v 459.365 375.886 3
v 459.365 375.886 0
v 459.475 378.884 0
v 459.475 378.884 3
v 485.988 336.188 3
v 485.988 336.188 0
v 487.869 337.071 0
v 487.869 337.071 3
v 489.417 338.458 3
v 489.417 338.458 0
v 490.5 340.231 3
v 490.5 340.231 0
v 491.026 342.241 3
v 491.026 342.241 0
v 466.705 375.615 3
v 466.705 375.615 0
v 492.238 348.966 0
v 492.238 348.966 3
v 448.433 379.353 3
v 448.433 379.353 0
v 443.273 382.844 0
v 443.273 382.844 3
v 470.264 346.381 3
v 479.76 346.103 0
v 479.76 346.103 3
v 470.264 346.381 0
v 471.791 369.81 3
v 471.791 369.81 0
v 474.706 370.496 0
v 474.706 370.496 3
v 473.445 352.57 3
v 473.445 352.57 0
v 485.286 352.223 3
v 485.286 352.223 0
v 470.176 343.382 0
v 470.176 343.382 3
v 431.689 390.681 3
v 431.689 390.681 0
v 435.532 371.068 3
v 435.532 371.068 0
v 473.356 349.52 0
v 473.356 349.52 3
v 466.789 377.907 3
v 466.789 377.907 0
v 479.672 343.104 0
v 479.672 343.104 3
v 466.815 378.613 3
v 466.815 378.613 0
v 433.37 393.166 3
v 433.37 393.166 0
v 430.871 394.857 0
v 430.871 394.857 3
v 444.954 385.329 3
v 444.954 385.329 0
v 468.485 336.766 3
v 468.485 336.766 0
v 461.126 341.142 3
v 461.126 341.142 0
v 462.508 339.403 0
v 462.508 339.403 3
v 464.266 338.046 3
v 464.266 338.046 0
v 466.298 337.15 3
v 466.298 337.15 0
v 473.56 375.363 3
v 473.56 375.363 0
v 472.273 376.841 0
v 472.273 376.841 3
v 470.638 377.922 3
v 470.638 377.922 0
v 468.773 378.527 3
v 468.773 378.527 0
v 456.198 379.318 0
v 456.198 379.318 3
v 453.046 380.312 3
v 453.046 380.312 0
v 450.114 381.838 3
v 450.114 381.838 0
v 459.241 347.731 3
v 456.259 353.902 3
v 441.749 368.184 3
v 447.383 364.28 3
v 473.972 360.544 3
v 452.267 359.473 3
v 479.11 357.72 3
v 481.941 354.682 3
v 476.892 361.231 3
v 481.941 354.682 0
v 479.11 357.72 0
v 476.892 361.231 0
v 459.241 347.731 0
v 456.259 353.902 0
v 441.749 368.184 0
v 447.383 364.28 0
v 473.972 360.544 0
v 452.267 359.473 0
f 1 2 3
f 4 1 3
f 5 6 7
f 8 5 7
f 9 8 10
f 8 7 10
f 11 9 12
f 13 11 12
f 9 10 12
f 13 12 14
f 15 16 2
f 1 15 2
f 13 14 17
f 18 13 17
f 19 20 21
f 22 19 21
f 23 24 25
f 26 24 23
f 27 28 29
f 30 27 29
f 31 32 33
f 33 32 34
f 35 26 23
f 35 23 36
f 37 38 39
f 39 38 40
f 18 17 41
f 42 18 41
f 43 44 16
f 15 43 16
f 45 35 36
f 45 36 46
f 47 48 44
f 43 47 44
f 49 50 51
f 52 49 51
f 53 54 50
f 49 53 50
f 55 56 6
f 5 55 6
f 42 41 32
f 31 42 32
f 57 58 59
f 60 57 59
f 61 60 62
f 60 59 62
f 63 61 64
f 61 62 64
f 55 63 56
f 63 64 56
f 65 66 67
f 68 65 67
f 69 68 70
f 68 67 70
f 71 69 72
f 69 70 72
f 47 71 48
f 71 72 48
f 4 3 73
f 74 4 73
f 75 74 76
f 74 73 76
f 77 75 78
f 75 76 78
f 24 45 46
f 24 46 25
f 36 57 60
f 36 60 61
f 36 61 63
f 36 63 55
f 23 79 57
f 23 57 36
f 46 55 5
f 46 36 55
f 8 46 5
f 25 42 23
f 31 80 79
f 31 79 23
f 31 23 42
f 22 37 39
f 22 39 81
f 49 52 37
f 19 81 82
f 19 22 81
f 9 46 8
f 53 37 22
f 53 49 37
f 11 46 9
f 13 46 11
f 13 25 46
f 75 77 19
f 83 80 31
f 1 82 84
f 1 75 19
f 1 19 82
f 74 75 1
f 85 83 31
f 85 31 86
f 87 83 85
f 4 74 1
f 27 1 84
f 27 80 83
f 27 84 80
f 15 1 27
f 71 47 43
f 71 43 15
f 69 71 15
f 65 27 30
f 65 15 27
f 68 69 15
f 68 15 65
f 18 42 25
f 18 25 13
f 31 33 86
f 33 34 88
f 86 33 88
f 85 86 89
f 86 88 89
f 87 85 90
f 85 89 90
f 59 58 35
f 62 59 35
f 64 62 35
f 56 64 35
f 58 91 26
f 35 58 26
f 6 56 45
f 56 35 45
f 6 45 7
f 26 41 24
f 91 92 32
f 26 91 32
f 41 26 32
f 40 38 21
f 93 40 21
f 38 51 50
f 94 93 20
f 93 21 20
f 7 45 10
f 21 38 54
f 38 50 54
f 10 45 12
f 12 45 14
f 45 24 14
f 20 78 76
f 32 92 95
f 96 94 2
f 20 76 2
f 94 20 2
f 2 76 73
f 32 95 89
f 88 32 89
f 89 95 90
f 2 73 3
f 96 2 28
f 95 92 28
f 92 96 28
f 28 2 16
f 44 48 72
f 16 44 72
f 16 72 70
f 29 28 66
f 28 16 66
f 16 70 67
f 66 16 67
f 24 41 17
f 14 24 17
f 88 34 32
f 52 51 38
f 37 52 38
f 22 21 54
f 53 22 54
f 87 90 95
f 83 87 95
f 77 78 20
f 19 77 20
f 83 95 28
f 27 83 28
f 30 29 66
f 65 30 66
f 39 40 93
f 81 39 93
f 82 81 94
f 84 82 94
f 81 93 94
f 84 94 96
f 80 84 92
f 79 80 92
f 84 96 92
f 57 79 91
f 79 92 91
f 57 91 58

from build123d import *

# Parameters (mm, degrees)
BASE_EXTRUDE_DEPTH = 3


with BuildPart() as part:
    # Sketch1 → Base-Extrude (new body)
    with BuildSketch(Plane.XY):
        with BuildLine():
            Line((468.485101771, 336.766175753), (485.987733808, 336.188135391))
            ThreePointArc((485.987733808, 336.188135391), (489.416694784, 338.457661181), (491.026498899, 342.241449149))
            Line((491.026498899, 342.241449149), (492.238136306, 348.965913631))
            Line((492.238136306, 348.965913631), (473.355716317, 349.519727014))
            Line((473.355716317, 349.519727014), (473.445174068, 352.569813696))
            Line((473.445174068, 352.569813696), (485.286157606, 352.222522663))
            ThreePointArc((485.286157606, 352.222522663), (480.454254926, 356.13510234), (476.892234144, 361.230940955))
            Line((476.892234144, 361.230940955), (473.97203133, 360.543616051))
            Line((473.97203133, 360.543616051), (471.7909203, 369.810392981))
            Line((471.7909203, 369.810392981), (474.705571912, 370.496411305))
            Line((474.705571912, 370.496411305), (473.56015142, 375.362901844))
            ThreePointArc((473.56015142, 375.362901844), (470.637669512, 377.921889716), (466.815212769, 378.613369196))
            Line((466.815212769, 378.613369196), (466.789188287, 377.906806581))
            Line((466.789188287, 377.906806581), (466.704790084, 375.615402079))
            Line((466.704790084, 375.615402079), (459.364790084, 375.885752778))
            Line((459.364790084, 375.885752778), (459.475212769, 378.883719894))
            ThreePointArc((459.475212769, 378.883719894), (454.600522802, 379.746395641), (450.113675126, 381.838048014))
            Line((450.113675126, 381.838048014), (448.432649155, 379.353263982))
            Line((448.432649155, 379.353263982), (443.272580982, 382.844194581))
            Line((443.272580982, 382.844194581), (444.953606952, 385.328978613))
            Line((444.953606952, 385.328978613), (433.36986946, 393.165701366))
            Line((433.36986946, 393.165701366), (430.870547605, 394.856562582))
            Line((430.870547605, 394.856562582), (431.68884349, 390.680917334))
            Line((431.68884349, 390.680917334), (435.532374472, 371.067936044))
            ThreePointArc((435.532374472, 371.067936044), (452.26695125, 359.472706568), (461.126484264, 341.142292461))
            ThreePointArc((461.126484264, 341.142292461), (464.265694284, 338.046036211), (468.485101771, 336.766175753))
        make_face()
        Polygon((470.175766233, 343.382194878), (479.67168981, 343.103922683), (479.75956524, 346.102635392), (470.263641663, 346.380907586), align=None, mode=Mode.SUBTRACT)
    extrude(amount=BASE_EXTRUDE_DEPTH)


solid = part.part
